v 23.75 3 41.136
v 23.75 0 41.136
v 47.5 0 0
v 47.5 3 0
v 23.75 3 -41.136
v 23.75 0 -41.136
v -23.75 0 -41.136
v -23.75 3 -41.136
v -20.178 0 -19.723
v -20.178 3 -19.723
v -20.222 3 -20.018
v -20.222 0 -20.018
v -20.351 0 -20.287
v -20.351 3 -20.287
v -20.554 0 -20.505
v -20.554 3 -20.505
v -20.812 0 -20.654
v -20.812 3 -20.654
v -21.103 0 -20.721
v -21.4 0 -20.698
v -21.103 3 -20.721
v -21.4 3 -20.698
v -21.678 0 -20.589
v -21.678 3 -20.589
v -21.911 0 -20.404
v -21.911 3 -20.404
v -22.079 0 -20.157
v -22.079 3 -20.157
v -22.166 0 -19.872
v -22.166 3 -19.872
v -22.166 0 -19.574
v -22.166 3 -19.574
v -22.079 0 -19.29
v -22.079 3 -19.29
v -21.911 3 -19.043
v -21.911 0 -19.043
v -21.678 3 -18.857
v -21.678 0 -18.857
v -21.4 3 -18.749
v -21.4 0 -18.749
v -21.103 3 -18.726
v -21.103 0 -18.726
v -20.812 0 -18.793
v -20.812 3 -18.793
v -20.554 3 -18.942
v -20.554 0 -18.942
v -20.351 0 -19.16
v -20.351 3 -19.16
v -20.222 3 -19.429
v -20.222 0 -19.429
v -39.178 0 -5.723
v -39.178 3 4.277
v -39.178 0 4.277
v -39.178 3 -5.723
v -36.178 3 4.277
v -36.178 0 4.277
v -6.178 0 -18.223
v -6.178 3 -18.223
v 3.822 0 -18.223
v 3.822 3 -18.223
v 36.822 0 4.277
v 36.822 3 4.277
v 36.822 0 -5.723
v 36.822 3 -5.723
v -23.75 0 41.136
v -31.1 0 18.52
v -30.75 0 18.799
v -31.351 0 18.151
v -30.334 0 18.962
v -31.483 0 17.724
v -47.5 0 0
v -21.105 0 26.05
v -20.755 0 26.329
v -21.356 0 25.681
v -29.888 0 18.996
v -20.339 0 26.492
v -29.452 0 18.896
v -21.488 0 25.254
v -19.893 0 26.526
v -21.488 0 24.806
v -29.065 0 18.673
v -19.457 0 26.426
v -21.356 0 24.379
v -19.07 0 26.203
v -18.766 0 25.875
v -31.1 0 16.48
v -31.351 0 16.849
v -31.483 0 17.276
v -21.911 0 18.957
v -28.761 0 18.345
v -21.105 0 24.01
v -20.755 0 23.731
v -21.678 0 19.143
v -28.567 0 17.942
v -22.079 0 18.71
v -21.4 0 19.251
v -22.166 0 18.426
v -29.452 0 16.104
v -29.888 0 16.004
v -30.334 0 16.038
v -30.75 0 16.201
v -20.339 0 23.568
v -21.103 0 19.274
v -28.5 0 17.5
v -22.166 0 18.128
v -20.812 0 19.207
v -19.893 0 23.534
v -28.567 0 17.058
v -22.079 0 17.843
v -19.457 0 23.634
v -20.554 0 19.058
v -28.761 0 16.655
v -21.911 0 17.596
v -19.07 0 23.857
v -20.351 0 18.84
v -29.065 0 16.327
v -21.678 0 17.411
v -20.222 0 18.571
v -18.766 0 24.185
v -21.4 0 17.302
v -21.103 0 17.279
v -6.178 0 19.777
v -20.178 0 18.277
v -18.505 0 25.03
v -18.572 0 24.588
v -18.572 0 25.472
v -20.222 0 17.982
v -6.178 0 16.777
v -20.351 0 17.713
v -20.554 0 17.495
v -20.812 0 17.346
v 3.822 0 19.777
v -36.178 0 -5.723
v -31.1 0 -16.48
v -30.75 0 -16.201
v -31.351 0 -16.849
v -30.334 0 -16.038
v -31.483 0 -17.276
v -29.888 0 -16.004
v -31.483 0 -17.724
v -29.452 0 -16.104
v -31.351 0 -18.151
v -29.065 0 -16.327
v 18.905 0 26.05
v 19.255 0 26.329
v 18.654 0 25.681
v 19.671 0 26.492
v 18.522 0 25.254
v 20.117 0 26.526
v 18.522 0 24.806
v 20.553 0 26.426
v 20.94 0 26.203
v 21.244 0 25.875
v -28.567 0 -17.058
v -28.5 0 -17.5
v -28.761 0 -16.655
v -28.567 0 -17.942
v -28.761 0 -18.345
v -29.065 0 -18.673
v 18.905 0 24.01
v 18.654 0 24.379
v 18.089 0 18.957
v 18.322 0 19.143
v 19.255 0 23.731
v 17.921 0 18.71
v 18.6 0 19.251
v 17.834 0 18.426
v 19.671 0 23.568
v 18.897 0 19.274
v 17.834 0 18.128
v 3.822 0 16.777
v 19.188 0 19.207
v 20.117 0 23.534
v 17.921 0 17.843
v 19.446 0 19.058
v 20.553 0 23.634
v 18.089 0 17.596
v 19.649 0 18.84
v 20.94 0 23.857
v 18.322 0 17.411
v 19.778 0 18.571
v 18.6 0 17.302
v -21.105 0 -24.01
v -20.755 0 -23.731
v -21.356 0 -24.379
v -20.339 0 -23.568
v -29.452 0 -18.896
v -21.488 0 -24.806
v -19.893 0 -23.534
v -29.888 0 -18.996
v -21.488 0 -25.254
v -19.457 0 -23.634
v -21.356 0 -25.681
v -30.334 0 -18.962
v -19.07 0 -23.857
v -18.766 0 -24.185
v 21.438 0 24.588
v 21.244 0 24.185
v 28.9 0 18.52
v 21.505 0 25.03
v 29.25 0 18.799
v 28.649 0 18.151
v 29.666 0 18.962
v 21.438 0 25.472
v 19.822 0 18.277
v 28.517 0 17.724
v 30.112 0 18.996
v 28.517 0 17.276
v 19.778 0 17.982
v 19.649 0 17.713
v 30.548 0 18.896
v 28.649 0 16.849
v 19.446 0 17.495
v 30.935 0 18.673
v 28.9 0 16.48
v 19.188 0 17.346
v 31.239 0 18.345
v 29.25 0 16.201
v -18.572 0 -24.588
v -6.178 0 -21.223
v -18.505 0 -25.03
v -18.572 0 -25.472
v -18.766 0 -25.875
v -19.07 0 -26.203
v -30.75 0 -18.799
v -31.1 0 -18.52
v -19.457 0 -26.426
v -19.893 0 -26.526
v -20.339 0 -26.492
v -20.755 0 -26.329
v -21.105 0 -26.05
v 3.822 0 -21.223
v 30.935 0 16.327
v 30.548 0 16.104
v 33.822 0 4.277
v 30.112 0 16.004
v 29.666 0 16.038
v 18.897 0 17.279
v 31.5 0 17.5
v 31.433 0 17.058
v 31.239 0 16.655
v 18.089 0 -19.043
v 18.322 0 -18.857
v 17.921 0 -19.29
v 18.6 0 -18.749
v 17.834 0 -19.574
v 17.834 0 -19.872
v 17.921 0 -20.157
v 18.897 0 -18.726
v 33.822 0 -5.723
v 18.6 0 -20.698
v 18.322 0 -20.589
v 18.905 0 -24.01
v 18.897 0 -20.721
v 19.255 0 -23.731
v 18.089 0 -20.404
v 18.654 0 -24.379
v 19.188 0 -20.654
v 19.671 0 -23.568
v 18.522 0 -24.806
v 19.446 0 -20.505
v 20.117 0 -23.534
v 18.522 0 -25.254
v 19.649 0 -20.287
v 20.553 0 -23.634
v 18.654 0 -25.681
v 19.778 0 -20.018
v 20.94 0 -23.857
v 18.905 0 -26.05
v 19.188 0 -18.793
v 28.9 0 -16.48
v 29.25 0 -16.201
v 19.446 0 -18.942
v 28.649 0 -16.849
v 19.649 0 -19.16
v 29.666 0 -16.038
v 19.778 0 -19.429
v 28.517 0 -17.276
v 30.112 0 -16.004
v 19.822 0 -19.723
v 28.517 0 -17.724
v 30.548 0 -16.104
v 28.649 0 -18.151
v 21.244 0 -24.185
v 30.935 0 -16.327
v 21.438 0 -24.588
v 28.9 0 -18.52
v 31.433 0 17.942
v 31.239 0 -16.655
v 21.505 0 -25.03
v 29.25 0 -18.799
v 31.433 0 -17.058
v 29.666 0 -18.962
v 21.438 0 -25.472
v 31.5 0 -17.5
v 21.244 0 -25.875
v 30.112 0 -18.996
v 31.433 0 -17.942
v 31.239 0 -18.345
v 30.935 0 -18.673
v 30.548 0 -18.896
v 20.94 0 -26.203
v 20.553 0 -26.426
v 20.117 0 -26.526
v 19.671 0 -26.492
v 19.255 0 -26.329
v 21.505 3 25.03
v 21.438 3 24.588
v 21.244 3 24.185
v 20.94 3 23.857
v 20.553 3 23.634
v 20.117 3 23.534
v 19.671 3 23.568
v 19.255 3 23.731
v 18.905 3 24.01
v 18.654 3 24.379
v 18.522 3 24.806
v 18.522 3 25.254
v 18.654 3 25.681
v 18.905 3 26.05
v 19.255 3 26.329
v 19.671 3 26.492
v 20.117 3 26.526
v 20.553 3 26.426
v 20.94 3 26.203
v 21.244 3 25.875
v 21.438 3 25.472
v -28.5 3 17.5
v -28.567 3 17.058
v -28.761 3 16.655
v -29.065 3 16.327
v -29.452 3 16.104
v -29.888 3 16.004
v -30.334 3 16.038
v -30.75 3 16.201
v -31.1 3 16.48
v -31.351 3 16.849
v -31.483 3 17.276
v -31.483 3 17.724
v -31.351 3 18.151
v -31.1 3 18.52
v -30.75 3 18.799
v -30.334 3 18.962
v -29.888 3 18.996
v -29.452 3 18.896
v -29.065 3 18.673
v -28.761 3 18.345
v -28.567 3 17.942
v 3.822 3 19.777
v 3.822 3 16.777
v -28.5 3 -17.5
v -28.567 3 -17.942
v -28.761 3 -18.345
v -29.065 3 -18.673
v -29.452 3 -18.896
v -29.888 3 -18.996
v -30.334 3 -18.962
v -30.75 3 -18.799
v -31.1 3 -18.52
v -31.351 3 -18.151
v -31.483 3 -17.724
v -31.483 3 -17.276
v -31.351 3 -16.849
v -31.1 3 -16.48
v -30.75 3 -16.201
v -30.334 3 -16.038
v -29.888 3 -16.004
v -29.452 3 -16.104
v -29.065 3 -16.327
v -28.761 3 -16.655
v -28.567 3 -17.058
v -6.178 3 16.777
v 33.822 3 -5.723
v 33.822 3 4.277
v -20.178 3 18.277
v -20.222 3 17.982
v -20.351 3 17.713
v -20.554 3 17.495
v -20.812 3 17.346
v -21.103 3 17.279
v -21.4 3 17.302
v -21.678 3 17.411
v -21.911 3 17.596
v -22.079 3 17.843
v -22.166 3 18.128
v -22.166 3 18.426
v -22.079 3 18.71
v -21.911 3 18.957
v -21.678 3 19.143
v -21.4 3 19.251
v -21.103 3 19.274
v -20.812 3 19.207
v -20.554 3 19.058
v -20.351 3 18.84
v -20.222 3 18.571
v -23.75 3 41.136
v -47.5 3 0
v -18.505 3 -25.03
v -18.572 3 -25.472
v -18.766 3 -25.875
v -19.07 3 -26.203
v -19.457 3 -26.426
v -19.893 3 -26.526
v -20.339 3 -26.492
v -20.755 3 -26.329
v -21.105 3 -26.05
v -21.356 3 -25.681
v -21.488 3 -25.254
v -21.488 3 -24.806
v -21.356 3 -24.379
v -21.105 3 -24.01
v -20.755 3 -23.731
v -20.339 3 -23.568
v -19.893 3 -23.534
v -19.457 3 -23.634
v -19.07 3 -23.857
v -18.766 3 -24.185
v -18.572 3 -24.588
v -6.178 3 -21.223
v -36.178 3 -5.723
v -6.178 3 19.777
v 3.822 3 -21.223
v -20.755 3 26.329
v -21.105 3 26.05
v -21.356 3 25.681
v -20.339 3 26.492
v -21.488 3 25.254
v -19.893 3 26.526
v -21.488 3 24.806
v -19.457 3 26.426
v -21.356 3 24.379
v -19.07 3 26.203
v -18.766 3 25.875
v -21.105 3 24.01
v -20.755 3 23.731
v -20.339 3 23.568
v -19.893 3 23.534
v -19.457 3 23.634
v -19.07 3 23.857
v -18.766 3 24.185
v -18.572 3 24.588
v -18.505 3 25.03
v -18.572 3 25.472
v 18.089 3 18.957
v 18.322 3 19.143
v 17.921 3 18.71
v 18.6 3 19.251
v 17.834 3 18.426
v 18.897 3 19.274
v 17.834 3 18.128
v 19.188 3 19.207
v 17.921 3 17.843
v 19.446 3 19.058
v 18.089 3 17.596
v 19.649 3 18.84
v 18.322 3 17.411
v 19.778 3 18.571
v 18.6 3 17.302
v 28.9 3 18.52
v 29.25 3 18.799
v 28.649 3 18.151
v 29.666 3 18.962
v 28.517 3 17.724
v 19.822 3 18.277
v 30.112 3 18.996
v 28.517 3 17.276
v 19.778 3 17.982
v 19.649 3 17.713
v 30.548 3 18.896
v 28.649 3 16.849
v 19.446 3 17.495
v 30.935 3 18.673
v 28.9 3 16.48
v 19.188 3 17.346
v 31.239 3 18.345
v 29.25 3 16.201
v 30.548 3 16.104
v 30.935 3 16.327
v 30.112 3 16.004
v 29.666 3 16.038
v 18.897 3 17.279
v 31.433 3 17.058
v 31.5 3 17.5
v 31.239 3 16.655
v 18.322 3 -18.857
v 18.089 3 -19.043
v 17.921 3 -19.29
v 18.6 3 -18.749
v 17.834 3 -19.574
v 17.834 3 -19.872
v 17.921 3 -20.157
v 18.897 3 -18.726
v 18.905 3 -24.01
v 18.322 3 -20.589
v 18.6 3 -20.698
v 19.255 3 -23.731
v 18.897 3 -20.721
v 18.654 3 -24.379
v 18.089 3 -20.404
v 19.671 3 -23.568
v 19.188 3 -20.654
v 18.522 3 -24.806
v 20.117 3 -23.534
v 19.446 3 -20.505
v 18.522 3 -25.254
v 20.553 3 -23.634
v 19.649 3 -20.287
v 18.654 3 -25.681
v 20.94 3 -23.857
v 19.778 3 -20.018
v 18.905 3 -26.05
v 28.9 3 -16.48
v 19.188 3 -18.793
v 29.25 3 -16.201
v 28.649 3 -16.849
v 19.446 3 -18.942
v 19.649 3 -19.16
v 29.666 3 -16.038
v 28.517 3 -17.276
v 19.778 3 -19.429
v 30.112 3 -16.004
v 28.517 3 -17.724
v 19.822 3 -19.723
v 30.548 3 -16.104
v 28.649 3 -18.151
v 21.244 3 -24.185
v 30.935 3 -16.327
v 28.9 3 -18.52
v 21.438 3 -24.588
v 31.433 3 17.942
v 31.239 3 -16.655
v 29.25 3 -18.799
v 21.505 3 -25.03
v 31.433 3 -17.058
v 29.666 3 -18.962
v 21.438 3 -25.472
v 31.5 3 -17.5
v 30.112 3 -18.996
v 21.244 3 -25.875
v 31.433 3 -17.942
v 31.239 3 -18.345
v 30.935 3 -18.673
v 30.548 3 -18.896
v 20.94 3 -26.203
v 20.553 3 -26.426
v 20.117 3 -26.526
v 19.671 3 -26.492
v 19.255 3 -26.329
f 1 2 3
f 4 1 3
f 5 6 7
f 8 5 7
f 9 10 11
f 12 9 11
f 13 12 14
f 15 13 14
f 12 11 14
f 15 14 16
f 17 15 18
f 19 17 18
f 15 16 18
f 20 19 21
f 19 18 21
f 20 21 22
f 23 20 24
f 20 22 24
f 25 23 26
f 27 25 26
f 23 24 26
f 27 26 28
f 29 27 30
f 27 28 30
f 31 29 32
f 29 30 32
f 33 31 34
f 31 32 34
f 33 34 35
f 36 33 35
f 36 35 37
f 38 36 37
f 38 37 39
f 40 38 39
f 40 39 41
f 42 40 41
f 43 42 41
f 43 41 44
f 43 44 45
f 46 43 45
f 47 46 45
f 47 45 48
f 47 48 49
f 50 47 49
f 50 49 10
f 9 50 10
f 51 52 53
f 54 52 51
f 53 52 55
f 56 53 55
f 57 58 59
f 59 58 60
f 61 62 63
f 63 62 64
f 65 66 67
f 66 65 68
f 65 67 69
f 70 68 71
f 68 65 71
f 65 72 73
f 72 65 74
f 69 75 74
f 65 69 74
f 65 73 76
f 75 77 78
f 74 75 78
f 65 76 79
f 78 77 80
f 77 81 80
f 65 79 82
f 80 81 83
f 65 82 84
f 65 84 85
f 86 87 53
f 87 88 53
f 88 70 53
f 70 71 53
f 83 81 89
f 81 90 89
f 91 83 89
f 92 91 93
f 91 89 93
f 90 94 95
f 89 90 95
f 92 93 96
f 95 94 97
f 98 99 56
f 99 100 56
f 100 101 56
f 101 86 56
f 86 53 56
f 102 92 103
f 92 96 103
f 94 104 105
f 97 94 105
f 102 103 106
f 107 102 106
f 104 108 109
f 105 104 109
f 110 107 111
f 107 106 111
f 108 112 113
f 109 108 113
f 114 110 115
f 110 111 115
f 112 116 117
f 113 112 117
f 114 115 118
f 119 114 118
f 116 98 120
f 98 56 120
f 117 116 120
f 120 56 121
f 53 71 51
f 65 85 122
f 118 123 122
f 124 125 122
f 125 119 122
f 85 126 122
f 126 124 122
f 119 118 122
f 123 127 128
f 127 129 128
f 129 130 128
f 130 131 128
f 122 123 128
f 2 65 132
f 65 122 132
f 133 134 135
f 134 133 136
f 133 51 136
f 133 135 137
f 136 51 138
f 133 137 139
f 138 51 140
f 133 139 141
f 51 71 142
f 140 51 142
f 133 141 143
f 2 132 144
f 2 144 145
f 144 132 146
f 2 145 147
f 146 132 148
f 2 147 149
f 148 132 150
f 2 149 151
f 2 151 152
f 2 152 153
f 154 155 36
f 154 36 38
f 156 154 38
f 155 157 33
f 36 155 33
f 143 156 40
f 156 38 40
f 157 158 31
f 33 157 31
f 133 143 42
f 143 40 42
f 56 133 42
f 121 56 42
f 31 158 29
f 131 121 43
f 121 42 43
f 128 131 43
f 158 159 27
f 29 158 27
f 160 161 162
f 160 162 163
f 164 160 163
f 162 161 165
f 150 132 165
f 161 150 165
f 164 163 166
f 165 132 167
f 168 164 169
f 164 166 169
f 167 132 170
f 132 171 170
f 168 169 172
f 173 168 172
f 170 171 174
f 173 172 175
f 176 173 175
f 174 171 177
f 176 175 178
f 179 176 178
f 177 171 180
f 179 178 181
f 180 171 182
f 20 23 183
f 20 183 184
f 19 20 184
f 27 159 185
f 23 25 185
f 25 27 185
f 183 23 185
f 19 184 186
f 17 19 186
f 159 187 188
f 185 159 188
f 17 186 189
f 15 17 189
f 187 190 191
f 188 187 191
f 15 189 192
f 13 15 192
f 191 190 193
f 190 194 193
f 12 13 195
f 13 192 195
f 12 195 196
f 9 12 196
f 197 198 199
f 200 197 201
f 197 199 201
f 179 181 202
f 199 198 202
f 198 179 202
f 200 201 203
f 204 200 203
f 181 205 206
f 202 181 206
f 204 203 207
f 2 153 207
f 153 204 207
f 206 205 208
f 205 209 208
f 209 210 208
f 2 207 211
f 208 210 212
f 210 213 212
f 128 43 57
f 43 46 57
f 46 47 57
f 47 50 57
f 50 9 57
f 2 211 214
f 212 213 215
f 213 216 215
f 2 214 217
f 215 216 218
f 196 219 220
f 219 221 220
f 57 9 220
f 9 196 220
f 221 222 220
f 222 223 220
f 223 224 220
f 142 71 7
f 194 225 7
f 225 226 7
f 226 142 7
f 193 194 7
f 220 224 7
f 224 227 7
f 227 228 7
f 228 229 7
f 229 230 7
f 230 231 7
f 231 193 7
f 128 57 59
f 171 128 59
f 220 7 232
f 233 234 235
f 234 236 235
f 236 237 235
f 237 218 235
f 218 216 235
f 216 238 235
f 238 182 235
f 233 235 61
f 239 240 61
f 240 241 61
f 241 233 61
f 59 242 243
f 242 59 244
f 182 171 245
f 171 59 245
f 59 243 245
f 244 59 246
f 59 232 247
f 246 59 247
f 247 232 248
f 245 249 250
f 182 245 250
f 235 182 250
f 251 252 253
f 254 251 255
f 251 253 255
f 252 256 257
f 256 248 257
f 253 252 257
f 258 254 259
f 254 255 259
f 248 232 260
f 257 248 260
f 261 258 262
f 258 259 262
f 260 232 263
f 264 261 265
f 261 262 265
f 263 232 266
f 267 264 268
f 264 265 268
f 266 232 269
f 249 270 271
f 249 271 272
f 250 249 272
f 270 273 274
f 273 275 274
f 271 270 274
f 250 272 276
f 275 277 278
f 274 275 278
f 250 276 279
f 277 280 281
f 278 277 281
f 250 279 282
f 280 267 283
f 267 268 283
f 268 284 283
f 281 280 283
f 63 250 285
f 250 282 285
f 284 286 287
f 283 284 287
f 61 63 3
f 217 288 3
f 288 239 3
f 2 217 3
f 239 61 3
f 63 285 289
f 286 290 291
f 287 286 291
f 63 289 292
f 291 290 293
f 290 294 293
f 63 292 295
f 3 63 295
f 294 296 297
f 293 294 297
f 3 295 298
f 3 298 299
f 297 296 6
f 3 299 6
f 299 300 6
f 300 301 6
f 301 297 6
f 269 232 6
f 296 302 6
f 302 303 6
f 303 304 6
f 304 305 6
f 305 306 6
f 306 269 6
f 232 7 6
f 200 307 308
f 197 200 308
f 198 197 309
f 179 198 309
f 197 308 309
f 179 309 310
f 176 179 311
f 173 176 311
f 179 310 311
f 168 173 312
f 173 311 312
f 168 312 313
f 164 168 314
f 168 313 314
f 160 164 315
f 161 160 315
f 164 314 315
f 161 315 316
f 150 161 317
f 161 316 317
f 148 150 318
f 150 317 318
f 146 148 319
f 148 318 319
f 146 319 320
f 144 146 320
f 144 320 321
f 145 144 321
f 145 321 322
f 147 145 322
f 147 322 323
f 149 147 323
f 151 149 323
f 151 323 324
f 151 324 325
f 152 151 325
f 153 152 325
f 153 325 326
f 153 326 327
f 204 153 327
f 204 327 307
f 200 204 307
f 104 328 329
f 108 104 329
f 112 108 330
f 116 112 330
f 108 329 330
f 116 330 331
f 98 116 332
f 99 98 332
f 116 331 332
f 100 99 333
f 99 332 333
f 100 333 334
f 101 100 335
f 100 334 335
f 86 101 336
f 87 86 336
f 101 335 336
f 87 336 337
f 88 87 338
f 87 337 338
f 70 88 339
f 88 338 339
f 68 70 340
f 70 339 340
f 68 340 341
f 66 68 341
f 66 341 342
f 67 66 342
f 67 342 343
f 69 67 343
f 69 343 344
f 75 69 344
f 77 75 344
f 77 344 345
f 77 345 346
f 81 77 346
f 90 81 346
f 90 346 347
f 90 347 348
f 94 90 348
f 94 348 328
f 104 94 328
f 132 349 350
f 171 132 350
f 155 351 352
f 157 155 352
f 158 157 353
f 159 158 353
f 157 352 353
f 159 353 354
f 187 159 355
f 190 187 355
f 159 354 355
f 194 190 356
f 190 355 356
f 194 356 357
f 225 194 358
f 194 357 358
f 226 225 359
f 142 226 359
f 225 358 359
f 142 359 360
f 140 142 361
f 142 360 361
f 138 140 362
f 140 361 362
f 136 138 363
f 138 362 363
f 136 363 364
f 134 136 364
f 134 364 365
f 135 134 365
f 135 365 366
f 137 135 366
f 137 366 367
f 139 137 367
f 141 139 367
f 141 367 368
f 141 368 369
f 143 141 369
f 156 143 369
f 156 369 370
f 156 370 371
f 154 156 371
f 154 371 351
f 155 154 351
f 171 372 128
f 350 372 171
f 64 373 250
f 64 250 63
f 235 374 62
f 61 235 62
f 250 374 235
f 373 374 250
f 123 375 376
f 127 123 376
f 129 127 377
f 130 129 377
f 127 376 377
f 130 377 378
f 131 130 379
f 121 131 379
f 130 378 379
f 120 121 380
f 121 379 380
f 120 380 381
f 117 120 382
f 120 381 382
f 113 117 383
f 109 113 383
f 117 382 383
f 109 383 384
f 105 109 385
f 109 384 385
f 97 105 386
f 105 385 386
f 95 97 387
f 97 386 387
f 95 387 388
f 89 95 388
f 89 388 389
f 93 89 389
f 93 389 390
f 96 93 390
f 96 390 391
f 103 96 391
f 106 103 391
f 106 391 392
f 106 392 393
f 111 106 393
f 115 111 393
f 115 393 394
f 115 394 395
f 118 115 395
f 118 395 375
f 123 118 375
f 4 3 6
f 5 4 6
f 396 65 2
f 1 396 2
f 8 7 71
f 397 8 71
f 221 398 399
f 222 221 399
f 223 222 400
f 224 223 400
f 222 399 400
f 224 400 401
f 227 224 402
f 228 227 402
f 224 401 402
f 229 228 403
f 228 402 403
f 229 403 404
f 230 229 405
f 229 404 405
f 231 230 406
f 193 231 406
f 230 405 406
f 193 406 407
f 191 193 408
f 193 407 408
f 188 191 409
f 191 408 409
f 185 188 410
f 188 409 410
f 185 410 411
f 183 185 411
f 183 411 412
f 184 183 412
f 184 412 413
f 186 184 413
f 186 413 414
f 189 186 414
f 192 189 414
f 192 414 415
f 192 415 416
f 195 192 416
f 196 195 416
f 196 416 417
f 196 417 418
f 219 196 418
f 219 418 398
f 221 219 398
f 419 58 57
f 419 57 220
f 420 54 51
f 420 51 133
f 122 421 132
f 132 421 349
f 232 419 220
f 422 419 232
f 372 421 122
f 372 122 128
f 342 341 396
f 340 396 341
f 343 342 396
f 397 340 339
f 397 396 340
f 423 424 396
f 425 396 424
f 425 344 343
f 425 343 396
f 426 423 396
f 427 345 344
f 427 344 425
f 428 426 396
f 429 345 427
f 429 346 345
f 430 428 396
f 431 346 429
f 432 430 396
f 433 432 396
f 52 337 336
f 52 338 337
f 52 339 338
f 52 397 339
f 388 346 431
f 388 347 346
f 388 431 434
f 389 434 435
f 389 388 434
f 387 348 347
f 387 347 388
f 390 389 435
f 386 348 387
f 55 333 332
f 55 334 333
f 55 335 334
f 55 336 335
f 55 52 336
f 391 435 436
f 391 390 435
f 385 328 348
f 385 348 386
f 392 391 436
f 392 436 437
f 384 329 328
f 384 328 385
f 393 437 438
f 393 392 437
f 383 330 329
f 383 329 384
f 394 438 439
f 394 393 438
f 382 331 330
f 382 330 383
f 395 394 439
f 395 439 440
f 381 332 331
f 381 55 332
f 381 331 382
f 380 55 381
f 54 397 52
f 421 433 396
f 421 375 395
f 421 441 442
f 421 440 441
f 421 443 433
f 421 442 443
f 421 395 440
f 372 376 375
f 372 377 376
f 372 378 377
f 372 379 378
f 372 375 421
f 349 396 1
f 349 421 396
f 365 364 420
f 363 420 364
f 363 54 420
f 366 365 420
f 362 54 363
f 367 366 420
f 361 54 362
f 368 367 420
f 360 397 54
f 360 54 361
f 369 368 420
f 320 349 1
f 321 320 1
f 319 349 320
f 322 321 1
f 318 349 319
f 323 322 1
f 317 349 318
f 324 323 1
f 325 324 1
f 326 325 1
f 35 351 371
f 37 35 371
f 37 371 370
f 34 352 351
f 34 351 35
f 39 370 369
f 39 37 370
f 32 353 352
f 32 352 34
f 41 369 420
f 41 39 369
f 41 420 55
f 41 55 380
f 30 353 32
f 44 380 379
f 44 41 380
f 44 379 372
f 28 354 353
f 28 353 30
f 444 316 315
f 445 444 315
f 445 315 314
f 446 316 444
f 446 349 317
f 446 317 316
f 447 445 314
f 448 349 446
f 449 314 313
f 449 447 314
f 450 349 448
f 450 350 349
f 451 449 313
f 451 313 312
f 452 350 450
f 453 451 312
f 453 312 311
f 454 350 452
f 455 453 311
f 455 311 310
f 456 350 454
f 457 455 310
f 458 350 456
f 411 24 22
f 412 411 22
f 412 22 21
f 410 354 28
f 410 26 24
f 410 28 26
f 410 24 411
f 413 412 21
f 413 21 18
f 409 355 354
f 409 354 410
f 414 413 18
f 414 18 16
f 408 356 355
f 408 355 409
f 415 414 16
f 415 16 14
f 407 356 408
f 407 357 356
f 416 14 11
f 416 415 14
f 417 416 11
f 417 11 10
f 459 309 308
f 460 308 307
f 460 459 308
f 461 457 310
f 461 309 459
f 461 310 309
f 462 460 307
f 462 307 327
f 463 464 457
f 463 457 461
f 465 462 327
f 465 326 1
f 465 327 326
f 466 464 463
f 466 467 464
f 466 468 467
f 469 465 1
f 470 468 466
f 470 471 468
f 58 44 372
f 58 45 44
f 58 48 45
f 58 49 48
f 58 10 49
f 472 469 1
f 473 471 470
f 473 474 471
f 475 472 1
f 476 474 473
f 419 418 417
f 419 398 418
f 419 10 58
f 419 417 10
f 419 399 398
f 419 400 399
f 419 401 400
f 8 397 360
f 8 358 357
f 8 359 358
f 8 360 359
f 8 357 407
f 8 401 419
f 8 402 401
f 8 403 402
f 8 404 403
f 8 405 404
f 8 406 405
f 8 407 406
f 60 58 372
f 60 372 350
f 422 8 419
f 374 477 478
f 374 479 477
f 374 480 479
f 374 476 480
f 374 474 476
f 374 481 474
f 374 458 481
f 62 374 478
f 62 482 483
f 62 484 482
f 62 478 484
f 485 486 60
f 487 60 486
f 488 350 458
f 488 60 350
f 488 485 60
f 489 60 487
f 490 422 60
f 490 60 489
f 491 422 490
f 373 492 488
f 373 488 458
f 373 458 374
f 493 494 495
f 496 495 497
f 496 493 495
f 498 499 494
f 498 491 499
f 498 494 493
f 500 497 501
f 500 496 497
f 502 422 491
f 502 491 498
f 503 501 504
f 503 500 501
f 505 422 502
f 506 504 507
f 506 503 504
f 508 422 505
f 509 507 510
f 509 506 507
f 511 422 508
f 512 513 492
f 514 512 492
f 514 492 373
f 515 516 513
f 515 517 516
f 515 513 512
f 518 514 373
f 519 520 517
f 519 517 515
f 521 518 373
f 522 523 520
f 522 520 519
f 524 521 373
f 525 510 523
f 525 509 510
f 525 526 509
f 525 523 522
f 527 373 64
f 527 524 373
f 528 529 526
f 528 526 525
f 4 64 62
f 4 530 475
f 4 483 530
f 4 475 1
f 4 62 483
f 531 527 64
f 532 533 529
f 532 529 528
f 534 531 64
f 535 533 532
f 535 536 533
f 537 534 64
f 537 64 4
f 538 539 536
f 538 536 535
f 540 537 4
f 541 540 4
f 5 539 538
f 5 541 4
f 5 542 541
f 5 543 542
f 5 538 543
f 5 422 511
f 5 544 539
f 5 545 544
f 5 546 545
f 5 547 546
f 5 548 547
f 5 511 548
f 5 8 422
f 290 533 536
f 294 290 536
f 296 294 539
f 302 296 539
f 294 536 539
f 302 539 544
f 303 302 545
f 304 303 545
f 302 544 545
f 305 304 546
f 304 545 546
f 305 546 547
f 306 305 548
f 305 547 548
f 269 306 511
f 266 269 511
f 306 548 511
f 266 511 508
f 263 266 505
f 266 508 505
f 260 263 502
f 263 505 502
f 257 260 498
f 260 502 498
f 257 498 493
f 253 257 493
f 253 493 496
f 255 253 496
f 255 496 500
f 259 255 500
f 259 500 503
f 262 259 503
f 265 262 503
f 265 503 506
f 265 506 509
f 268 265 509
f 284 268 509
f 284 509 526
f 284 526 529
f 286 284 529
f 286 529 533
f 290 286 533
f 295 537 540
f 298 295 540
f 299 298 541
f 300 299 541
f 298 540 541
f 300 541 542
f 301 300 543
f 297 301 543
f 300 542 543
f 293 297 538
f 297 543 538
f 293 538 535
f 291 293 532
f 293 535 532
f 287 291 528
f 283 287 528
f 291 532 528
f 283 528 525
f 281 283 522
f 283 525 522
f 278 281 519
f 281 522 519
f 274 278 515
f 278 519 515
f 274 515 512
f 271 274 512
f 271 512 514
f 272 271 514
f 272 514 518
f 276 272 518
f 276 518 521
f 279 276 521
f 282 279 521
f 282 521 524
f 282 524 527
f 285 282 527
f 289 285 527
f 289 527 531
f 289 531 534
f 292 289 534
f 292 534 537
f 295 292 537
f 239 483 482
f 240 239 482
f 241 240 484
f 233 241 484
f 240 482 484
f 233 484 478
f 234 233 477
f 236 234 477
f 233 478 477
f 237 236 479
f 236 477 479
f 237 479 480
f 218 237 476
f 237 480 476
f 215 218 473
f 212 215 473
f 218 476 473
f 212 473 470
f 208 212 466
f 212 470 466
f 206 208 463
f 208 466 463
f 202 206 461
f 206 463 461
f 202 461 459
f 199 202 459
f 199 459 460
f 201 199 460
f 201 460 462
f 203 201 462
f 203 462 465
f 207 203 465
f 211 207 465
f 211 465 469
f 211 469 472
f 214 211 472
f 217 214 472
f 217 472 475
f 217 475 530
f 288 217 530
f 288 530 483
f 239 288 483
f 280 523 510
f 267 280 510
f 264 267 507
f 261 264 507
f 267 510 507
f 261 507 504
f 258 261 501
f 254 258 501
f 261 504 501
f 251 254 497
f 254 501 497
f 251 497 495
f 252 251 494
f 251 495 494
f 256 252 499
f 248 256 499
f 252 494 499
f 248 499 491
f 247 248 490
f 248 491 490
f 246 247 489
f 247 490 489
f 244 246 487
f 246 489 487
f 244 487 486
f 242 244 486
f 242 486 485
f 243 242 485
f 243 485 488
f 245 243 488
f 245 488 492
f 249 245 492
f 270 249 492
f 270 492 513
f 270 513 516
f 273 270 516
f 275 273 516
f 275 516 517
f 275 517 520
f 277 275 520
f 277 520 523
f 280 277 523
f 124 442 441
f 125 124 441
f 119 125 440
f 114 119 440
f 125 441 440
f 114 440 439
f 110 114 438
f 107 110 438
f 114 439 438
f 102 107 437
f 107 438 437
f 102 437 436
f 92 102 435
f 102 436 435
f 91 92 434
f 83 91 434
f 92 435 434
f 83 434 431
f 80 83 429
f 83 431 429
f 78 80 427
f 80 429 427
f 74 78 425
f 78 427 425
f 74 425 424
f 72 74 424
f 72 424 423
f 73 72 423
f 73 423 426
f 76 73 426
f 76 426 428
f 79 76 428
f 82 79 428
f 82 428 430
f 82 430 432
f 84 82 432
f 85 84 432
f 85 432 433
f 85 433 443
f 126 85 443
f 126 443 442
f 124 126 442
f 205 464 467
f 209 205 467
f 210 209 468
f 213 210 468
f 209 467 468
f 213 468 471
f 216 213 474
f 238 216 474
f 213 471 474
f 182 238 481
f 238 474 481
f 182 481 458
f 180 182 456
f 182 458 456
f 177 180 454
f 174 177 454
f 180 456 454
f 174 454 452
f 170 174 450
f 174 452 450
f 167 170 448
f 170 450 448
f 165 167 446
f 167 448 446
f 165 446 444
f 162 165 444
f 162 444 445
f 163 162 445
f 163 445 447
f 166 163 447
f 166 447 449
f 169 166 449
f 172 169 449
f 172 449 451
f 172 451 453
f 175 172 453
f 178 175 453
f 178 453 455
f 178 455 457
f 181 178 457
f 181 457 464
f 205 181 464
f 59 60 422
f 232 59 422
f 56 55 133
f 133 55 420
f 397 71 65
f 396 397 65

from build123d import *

# Parameters (mm, degrees)
SALIENTE_EXTRUIR1_DEPTH = 3
CROQUIS3_R              = 1
CROQUIS3_W              = 10
CROQUIS3_H              = 3
CROQUIS3_W_2            = 3
CROQUIS3_H_2            = 10
CORTAR_EXTRUIR1_DEPTH   = 4
CROQUIS4_R              = 1.5
CORTAR_EXTRUIR2_DEPTH   = 4
CROQUIS5_R              = 1.5
CORTAR_EXTRUIR3_DEPTH   = 4


with BuildPart() as part:
    # Croquis1 → Saliente-Extruir1 (new body)
    with BuildSketch(Plane(origin=(0, 0, 0), x_dir=(1, 0, 0), z_dir=(0, 1, 0))):
        Polygon((-47.5, 0), (-23.75, -41.13620668), (23.75, -41.13620668), (47.5, 0), (23.75, 41.13620668), (-23.75, 41.13620668), align=None)
    extrude(amount=SALIENTE_EXTRUIR1_DEPTH)

    # Croquis3 → Cortar-Extruir1 (cut, through all)
    with BuildSketch(Plane(origin=(0, 3, 0), x_dir=(1, 0, 0), z_dir=(0, 1, 0))):
        with Locations((-21.177619762, 19.723456661)):
            Circle(CROQUIS3_R)
        with Locations((18.822380238, 19.723456661)):
            Circle(CROQUIS3_R)
        with Locations((18.822380238, -18.276543339)):
            Circle(CROQUIS3_R)
        with Locations((-21.177619762, -18.276543339)):
            Circle(CROQUIS3_R)
        with Locations((-1.177619762, 19.723456661)):
            Rectangle(CROQUIS3_W, CROQUIS3_H)
        with Locations((35.322380238, 0.723456661)):
            Rectangle(CROQUIS3_W_2, CROQUIS3_H_2)
        with Locations((-1.177619762, -18.276543339)):
            Rectangle(CROQUIS3_W, CROQUIS3_H)
        with Locations((-37.677619762, 0.723456661)):
            Rectangle(CROQUIS3_W_2, CROQUIS3_H_2)
    extrude(amount=-CORTAR_EXTRUIR1_DEPTH, mode=Mode.SUBTRACT)

    # Croquis4 → Cortar-Extruir2 (cut, through all)
    with BuildSketch(Plane(origin=(0, 3, 0), x_dir=(1, 0, 0), z_dir=(0, 1, 0))):
        with Locations((20.005, -25.03)):
            Circle(CROQUIS4_R)
        with Locations((20.005, 25.03)):
            Circle(CROQUIS4_R)
        with Locations((-20.005, 25.03)):
            Circle(CROQUIS4_R)
        with Locations((-20.005, -25.03)):
            Circle(CROQUIS4_R)
    extrude(amount=-CORTAR_EXTRUIR2_DEPTH, mode=Mode.SUBTRACT)

    # Croquis5 → Cortar-Extruir3 (cut, through all)
    with BuildSketch(Plane(origin=(0, 3, 0), x_dir=(1, 0, 0), z_dir=(0, 1, 0))):
        with Locations((30, 17.5)):
            Circle(CROQUIS5_R)
        with Locations((30, -17.5)):
            Circle(CROQUIS5_R)
        with Locations((-30, -17.5)):
            Circle(CROQUIS5_R)
        with Locations((-30, 17.5)):
            Circle(CROQUIS5_R)
    extrude(amount=-CORTAR_EXTRUIR3_DEPTH, mode=Mode.SUBTRACT)


solid = part.part
